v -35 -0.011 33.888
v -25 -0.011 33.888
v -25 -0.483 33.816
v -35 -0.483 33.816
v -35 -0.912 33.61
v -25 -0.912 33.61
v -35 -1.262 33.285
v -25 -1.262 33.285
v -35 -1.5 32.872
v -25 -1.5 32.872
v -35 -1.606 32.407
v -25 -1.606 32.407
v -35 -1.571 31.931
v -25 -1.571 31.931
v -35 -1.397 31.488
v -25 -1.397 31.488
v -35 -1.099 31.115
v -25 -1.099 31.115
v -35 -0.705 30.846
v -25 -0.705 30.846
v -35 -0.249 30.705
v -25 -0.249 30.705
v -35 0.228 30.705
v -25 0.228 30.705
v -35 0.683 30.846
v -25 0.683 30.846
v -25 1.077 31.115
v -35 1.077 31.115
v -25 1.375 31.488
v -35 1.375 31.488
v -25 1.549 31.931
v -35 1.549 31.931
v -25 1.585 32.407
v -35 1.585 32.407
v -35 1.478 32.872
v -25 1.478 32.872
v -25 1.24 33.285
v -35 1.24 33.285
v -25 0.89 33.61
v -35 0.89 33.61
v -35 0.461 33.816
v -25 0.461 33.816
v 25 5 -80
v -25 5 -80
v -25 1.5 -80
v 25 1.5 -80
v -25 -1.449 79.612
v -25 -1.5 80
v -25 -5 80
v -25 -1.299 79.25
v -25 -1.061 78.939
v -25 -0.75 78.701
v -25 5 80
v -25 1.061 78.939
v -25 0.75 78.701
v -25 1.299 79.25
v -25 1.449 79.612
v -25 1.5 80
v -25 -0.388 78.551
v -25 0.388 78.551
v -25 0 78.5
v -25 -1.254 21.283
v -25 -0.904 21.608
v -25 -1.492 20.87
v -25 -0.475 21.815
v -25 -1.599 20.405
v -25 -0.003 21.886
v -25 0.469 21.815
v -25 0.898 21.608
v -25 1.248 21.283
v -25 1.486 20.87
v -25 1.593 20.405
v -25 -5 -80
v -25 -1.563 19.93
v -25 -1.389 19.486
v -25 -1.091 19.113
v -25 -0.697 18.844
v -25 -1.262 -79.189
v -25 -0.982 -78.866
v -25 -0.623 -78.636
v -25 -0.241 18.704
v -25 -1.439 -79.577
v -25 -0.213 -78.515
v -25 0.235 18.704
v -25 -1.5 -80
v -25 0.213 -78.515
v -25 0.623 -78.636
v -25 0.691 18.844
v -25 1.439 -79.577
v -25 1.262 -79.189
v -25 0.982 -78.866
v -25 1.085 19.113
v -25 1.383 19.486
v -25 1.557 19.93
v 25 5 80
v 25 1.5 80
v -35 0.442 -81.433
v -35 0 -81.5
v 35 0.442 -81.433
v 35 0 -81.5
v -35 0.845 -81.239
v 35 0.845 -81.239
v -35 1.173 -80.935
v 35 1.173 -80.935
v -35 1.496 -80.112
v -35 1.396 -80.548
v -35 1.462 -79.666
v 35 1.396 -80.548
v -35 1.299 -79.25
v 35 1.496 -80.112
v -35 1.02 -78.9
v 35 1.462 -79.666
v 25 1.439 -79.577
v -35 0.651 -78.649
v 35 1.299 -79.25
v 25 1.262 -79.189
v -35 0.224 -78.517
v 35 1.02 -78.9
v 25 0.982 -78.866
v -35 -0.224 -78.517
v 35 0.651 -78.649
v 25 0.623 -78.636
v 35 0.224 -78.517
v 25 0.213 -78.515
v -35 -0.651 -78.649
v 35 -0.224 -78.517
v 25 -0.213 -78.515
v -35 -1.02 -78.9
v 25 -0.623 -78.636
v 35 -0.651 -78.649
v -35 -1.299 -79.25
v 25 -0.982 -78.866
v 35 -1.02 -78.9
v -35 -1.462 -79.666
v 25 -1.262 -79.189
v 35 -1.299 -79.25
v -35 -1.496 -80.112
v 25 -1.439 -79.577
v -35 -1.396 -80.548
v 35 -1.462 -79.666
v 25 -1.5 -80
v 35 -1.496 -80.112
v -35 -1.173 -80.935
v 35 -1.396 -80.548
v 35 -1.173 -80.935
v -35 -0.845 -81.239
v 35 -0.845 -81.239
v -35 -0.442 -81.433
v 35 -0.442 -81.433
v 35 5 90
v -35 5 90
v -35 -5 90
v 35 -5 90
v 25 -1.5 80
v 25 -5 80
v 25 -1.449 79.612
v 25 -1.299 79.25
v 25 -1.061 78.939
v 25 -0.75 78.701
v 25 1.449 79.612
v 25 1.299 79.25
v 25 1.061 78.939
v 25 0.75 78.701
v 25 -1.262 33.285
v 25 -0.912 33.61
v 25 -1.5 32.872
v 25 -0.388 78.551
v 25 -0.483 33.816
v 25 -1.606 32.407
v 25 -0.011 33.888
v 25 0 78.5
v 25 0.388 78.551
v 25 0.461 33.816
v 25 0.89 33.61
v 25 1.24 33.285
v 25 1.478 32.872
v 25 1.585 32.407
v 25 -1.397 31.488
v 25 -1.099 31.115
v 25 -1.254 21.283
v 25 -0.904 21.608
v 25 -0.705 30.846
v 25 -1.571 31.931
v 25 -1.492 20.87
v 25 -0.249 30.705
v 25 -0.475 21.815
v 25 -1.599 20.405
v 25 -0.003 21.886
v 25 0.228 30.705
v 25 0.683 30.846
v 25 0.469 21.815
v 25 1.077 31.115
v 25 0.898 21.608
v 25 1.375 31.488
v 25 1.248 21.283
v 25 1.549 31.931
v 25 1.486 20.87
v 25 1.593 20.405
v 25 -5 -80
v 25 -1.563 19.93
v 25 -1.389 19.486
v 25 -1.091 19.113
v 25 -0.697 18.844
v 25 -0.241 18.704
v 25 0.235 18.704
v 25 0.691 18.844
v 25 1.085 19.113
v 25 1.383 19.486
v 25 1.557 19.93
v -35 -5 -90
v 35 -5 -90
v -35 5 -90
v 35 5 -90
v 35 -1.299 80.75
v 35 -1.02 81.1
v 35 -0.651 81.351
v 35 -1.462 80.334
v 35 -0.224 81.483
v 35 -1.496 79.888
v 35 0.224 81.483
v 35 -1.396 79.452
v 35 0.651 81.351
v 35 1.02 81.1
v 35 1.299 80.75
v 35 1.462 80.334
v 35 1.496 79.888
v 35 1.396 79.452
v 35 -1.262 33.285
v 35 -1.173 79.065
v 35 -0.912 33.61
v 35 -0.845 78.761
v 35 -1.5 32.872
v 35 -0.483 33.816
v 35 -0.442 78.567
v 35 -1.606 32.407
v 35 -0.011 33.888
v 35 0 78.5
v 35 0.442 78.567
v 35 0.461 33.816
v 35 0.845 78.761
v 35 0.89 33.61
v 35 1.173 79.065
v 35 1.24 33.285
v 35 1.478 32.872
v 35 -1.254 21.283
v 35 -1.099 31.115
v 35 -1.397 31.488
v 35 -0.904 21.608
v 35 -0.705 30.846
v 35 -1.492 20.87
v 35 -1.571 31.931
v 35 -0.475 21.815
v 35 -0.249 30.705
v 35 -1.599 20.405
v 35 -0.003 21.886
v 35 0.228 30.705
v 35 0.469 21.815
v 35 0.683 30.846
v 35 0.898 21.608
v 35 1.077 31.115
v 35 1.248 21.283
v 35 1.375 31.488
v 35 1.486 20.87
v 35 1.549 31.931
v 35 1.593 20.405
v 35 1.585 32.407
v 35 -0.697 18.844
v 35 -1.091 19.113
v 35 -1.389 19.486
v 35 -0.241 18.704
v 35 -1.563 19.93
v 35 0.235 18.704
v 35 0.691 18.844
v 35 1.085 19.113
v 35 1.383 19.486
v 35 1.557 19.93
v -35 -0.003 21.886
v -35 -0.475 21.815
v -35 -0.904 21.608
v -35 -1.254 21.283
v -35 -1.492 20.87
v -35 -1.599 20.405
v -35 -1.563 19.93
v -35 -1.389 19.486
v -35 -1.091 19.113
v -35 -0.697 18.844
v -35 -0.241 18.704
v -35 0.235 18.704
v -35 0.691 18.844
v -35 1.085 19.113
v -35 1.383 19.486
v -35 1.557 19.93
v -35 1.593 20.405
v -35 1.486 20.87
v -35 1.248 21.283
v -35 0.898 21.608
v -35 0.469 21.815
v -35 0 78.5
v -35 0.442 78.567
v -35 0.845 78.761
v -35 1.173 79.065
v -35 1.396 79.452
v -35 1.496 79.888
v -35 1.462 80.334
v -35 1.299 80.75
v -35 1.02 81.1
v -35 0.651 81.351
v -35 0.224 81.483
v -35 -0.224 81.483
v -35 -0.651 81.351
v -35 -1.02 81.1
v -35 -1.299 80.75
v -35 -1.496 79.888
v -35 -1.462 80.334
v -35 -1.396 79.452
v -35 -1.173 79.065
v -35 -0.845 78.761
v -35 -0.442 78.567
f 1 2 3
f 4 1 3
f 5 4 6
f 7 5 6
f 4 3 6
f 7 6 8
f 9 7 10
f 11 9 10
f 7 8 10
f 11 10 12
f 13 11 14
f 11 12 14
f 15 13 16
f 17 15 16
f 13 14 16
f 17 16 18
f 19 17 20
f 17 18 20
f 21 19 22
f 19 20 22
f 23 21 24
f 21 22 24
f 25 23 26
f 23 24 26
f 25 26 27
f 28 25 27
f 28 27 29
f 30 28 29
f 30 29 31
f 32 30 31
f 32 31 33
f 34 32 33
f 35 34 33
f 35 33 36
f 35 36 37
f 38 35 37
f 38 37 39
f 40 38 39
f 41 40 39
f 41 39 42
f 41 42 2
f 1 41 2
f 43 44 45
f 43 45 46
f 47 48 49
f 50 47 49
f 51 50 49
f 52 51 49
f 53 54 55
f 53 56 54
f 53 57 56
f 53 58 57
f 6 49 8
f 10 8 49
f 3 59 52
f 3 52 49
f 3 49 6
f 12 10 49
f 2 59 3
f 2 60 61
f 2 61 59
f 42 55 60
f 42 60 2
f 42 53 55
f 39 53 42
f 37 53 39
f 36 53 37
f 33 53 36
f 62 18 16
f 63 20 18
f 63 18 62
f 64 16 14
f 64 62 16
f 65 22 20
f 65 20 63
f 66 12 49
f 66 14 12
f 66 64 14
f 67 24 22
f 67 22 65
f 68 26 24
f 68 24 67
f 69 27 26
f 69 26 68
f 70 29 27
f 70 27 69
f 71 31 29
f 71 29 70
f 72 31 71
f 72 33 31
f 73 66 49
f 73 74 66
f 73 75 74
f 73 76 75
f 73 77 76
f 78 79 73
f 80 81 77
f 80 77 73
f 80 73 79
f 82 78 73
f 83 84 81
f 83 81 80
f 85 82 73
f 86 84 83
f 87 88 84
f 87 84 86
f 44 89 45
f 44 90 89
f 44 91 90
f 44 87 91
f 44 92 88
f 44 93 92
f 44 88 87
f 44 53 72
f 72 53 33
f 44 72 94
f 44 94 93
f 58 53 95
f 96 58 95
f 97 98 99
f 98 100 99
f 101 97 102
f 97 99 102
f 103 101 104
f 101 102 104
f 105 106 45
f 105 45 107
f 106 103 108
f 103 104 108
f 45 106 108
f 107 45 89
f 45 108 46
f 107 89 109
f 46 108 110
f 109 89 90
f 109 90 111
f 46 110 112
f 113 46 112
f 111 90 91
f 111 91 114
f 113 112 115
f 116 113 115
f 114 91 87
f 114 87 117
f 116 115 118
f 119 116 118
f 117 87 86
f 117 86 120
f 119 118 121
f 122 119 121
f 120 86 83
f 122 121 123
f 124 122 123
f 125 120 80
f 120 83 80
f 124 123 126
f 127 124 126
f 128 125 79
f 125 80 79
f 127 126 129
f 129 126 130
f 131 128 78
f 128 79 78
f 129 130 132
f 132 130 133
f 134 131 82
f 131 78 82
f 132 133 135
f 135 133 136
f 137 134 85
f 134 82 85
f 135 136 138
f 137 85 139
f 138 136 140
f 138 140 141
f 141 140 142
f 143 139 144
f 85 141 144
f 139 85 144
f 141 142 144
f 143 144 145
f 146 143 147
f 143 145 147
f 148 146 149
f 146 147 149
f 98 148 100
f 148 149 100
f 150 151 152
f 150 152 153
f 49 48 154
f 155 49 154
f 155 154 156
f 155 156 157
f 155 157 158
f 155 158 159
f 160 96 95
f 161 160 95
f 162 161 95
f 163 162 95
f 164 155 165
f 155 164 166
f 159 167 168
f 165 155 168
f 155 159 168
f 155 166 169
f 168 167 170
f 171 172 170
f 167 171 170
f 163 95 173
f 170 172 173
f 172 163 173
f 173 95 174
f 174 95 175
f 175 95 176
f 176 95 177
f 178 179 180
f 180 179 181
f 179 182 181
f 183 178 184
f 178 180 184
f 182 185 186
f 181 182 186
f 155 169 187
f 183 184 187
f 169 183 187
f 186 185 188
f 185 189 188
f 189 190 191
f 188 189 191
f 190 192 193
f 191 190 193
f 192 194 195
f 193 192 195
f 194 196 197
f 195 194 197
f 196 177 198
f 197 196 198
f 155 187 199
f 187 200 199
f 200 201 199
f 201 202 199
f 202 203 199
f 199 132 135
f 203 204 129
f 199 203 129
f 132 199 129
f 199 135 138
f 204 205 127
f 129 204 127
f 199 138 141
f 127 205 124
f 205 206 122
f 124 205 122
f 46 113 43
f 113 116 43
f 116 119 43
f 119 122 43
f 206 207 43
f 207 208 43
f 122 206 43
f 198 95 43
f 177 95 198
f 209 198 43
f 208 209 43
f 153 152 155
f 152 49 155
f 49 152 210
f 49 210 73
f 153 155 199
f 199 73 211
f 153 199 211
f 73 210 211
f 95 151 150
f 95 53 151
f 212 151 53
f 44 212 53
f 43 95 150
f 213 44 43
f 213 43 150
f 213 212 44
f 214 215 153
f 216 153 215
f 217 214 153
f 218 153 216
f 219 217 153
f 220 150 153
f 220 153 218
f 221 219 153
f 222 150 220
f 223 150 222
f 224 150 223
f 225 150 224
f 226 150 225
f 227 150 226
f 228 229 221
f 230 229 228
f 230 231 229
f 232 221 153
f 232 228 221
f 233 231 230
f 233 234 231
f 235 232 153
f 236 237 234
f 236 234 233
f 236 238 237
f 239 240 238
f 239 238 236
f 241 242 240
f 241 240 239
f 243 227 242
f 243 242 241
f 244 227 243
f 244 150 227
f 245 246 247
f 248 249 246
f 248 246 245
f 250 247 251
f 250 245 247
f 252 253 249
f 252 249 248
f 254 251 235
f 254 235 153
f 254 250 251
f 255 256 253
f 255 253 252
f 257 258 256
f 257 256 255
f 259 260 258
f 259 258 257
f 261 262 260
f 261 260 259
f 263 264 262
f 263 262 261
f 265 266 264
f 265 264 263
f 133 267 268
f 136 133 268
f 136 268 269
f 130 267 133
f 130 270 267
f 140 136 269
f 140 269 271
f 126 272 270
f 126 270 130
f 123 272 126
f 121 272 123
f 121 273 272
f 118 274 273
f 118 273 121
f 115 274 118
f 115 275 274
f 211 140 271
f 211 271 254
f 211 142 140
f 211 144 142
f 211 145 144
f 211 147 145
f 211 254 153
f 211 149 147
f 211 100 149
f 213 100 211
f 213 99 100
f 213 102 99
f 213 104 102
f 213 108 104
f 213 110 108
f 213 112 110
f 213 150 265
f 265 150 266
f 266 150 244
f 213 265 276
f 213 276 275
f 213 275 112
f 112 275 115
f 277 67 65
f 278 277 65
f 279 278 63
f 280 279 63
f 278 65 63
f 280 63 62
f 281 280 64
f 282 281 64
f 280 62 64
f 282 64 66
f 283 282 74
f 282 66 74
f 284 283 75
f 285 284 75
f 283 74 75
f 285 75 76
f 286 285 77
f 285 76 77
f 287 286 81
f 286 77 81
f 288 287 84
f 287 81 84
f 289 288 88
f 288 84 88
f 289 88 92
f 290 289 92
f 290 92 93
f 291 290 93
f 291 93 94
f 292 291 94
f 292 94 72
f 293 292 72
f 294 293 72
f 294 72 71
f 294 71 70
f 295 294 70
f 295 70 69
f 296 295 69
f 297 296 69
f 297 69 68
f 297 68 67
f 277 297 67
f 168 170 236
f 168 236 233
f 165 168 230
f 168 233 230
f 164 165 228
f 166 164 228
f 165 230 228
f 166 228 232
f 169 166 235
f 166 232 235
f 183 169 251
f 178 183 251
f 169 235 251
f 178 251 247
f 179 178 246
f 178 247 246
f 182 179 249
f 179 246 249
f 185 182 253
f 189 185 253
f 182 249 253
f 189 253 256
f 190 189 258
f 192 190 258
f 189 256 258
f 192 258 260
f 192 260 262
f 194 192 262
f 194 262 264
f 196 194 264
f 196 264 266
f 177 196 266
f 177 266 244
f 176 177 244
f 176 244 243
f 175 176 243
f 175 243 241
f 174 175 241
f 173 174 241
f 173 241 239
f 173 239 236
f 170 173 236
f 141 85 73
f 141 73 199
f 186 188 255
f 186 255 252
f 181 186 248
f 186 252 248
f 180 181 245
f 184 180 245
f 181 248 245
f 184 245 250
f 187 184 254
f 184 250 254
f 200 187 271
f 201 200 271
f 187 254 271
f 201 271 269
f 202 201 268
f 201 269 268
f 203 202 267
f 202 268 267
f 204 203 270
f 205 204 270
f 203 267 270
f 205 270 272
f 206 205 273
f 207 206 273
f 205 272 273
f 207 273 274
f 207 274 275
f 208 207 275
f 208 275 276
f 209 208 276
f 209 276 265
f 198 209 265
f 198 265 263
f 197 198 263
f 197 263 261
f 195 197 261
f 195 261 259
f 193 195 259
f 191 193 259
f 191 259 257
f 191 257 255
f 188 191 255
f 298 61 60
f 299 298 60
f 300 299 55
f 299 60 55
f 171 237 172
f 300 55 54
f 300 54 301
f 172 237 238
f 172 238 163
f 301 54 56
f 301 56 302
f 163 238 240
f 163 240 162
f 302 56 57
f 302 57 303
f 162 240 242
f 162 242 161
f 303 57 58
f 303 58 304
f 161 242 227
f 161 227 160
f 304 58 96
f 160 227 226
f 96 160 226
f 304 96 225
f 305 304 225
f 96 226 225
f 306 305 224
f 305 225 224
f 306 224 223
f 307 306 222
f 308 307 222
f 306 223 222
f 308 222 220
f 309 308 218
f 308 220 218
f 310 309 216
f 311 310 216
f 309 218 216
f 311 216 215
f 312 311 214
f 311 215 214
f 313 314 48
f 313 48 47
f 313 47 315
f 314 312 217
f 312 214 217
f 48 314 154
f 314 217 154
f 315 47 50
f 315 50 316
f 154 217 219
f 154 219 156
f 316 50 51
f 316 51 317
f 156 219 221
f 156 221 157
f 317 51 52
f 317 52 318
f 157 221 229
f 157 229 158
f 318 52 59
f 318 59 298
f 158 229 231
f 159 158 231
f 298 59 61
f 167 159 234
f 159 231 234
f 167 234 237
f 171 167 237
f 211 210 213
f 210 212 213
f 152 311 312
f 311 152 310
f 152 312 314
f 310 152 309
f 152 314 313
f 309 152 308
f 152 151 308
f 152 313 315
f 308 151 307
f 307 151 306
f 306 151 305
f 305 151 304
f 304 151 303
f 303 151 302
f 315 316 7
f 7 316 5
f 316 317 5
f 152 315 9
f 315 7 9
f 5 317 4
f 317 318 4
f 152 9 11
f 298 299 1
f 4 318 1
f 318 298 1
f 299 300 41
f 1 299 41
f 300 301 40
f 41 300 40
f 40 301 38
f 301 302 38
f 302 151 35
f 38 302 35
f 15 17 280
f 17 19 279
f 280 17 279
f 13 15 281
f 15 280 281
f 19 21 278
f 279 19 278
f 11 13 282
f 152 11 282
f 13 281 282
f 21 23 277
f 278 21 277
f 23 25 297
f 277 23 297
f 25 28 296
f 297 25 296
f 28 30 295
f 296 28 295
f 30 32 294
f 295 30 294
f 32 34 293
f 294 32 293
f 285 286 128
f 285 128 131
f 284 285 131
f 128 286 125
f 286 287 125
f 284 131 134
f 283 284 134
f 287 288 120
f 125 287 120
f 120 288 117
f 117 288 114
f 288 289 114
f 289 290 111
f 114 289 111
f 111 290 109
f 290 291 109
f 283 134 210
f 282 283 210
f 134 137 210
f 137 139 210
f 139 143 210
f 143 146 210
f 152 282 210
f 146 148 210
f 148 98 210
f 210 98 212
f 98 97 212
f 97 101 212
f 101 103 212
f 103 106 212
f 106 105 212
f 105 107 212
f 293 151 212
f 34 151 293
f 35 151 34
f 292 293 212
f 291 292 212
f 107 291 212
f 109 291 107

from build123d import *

# Parameters (mm, degrees)
CROQUIS1_W                   = 70
CROQUIS1_H                   = 180
CROQUIS1_W_2                 = 50
CROQUIS1_H_2                 = 160
SALIENTE_EXTRUIR1_DEPTH      = 5
CROQUIS2_R                   = 1.5
CORTAR_EXTRUIR1_DEPTH        = 60
TALADRO_DE_MARGEN_PARA_M31_D = 3.2


with BuildPart() as part:
    # Croquis1 → Saliente-Extruir1 (new, symmetric)
    with BuildSketch(Plane(origin=(0, 0, 0), x_dir=(1, 0, 0), z_dir=(0, 1, 0))):
        Rectangle(CROQUIS1_W, CROQUIS1_H)
        Rectangle(CROQUIS1_W_2, CROQUIS1_H_2, mode=Mode.SUBTRACT)
    extrude(amount=SALIENTE_EXTRUIR1_DEPTH, both=True)

    # Croquis2 → Cortar-Extruir1 (cut, symmetric)
    with BuildSketch(Plane(origin=(0, 0, 0), x_dir=(0, 0, -1), z_dir=(1, 0, 0))):
        with Locations((-80, 0)):
            Circle(CROQUIS2_R)
        with Locations((80, 0)):
            Circle(CROQUIS2_R)
    extrude(amount=CORTAR_EXTRUIR1_DEPTH, both=True, mode=Mode.SUBTRACT)

    # Taladro de margen para M31 (through all)
    with Locations(Plane(origin=(-35, -0.010928271, 32.287523851), x_dir=(0, 0, -1), z_dir=(-1, 0, 0))):
        with Locations((0, 0), (12.001709214, -0.007929279)):
            Hole(TALADRO_DE_MARGEN_PARA_M31_D / 2)


solid = part.part
